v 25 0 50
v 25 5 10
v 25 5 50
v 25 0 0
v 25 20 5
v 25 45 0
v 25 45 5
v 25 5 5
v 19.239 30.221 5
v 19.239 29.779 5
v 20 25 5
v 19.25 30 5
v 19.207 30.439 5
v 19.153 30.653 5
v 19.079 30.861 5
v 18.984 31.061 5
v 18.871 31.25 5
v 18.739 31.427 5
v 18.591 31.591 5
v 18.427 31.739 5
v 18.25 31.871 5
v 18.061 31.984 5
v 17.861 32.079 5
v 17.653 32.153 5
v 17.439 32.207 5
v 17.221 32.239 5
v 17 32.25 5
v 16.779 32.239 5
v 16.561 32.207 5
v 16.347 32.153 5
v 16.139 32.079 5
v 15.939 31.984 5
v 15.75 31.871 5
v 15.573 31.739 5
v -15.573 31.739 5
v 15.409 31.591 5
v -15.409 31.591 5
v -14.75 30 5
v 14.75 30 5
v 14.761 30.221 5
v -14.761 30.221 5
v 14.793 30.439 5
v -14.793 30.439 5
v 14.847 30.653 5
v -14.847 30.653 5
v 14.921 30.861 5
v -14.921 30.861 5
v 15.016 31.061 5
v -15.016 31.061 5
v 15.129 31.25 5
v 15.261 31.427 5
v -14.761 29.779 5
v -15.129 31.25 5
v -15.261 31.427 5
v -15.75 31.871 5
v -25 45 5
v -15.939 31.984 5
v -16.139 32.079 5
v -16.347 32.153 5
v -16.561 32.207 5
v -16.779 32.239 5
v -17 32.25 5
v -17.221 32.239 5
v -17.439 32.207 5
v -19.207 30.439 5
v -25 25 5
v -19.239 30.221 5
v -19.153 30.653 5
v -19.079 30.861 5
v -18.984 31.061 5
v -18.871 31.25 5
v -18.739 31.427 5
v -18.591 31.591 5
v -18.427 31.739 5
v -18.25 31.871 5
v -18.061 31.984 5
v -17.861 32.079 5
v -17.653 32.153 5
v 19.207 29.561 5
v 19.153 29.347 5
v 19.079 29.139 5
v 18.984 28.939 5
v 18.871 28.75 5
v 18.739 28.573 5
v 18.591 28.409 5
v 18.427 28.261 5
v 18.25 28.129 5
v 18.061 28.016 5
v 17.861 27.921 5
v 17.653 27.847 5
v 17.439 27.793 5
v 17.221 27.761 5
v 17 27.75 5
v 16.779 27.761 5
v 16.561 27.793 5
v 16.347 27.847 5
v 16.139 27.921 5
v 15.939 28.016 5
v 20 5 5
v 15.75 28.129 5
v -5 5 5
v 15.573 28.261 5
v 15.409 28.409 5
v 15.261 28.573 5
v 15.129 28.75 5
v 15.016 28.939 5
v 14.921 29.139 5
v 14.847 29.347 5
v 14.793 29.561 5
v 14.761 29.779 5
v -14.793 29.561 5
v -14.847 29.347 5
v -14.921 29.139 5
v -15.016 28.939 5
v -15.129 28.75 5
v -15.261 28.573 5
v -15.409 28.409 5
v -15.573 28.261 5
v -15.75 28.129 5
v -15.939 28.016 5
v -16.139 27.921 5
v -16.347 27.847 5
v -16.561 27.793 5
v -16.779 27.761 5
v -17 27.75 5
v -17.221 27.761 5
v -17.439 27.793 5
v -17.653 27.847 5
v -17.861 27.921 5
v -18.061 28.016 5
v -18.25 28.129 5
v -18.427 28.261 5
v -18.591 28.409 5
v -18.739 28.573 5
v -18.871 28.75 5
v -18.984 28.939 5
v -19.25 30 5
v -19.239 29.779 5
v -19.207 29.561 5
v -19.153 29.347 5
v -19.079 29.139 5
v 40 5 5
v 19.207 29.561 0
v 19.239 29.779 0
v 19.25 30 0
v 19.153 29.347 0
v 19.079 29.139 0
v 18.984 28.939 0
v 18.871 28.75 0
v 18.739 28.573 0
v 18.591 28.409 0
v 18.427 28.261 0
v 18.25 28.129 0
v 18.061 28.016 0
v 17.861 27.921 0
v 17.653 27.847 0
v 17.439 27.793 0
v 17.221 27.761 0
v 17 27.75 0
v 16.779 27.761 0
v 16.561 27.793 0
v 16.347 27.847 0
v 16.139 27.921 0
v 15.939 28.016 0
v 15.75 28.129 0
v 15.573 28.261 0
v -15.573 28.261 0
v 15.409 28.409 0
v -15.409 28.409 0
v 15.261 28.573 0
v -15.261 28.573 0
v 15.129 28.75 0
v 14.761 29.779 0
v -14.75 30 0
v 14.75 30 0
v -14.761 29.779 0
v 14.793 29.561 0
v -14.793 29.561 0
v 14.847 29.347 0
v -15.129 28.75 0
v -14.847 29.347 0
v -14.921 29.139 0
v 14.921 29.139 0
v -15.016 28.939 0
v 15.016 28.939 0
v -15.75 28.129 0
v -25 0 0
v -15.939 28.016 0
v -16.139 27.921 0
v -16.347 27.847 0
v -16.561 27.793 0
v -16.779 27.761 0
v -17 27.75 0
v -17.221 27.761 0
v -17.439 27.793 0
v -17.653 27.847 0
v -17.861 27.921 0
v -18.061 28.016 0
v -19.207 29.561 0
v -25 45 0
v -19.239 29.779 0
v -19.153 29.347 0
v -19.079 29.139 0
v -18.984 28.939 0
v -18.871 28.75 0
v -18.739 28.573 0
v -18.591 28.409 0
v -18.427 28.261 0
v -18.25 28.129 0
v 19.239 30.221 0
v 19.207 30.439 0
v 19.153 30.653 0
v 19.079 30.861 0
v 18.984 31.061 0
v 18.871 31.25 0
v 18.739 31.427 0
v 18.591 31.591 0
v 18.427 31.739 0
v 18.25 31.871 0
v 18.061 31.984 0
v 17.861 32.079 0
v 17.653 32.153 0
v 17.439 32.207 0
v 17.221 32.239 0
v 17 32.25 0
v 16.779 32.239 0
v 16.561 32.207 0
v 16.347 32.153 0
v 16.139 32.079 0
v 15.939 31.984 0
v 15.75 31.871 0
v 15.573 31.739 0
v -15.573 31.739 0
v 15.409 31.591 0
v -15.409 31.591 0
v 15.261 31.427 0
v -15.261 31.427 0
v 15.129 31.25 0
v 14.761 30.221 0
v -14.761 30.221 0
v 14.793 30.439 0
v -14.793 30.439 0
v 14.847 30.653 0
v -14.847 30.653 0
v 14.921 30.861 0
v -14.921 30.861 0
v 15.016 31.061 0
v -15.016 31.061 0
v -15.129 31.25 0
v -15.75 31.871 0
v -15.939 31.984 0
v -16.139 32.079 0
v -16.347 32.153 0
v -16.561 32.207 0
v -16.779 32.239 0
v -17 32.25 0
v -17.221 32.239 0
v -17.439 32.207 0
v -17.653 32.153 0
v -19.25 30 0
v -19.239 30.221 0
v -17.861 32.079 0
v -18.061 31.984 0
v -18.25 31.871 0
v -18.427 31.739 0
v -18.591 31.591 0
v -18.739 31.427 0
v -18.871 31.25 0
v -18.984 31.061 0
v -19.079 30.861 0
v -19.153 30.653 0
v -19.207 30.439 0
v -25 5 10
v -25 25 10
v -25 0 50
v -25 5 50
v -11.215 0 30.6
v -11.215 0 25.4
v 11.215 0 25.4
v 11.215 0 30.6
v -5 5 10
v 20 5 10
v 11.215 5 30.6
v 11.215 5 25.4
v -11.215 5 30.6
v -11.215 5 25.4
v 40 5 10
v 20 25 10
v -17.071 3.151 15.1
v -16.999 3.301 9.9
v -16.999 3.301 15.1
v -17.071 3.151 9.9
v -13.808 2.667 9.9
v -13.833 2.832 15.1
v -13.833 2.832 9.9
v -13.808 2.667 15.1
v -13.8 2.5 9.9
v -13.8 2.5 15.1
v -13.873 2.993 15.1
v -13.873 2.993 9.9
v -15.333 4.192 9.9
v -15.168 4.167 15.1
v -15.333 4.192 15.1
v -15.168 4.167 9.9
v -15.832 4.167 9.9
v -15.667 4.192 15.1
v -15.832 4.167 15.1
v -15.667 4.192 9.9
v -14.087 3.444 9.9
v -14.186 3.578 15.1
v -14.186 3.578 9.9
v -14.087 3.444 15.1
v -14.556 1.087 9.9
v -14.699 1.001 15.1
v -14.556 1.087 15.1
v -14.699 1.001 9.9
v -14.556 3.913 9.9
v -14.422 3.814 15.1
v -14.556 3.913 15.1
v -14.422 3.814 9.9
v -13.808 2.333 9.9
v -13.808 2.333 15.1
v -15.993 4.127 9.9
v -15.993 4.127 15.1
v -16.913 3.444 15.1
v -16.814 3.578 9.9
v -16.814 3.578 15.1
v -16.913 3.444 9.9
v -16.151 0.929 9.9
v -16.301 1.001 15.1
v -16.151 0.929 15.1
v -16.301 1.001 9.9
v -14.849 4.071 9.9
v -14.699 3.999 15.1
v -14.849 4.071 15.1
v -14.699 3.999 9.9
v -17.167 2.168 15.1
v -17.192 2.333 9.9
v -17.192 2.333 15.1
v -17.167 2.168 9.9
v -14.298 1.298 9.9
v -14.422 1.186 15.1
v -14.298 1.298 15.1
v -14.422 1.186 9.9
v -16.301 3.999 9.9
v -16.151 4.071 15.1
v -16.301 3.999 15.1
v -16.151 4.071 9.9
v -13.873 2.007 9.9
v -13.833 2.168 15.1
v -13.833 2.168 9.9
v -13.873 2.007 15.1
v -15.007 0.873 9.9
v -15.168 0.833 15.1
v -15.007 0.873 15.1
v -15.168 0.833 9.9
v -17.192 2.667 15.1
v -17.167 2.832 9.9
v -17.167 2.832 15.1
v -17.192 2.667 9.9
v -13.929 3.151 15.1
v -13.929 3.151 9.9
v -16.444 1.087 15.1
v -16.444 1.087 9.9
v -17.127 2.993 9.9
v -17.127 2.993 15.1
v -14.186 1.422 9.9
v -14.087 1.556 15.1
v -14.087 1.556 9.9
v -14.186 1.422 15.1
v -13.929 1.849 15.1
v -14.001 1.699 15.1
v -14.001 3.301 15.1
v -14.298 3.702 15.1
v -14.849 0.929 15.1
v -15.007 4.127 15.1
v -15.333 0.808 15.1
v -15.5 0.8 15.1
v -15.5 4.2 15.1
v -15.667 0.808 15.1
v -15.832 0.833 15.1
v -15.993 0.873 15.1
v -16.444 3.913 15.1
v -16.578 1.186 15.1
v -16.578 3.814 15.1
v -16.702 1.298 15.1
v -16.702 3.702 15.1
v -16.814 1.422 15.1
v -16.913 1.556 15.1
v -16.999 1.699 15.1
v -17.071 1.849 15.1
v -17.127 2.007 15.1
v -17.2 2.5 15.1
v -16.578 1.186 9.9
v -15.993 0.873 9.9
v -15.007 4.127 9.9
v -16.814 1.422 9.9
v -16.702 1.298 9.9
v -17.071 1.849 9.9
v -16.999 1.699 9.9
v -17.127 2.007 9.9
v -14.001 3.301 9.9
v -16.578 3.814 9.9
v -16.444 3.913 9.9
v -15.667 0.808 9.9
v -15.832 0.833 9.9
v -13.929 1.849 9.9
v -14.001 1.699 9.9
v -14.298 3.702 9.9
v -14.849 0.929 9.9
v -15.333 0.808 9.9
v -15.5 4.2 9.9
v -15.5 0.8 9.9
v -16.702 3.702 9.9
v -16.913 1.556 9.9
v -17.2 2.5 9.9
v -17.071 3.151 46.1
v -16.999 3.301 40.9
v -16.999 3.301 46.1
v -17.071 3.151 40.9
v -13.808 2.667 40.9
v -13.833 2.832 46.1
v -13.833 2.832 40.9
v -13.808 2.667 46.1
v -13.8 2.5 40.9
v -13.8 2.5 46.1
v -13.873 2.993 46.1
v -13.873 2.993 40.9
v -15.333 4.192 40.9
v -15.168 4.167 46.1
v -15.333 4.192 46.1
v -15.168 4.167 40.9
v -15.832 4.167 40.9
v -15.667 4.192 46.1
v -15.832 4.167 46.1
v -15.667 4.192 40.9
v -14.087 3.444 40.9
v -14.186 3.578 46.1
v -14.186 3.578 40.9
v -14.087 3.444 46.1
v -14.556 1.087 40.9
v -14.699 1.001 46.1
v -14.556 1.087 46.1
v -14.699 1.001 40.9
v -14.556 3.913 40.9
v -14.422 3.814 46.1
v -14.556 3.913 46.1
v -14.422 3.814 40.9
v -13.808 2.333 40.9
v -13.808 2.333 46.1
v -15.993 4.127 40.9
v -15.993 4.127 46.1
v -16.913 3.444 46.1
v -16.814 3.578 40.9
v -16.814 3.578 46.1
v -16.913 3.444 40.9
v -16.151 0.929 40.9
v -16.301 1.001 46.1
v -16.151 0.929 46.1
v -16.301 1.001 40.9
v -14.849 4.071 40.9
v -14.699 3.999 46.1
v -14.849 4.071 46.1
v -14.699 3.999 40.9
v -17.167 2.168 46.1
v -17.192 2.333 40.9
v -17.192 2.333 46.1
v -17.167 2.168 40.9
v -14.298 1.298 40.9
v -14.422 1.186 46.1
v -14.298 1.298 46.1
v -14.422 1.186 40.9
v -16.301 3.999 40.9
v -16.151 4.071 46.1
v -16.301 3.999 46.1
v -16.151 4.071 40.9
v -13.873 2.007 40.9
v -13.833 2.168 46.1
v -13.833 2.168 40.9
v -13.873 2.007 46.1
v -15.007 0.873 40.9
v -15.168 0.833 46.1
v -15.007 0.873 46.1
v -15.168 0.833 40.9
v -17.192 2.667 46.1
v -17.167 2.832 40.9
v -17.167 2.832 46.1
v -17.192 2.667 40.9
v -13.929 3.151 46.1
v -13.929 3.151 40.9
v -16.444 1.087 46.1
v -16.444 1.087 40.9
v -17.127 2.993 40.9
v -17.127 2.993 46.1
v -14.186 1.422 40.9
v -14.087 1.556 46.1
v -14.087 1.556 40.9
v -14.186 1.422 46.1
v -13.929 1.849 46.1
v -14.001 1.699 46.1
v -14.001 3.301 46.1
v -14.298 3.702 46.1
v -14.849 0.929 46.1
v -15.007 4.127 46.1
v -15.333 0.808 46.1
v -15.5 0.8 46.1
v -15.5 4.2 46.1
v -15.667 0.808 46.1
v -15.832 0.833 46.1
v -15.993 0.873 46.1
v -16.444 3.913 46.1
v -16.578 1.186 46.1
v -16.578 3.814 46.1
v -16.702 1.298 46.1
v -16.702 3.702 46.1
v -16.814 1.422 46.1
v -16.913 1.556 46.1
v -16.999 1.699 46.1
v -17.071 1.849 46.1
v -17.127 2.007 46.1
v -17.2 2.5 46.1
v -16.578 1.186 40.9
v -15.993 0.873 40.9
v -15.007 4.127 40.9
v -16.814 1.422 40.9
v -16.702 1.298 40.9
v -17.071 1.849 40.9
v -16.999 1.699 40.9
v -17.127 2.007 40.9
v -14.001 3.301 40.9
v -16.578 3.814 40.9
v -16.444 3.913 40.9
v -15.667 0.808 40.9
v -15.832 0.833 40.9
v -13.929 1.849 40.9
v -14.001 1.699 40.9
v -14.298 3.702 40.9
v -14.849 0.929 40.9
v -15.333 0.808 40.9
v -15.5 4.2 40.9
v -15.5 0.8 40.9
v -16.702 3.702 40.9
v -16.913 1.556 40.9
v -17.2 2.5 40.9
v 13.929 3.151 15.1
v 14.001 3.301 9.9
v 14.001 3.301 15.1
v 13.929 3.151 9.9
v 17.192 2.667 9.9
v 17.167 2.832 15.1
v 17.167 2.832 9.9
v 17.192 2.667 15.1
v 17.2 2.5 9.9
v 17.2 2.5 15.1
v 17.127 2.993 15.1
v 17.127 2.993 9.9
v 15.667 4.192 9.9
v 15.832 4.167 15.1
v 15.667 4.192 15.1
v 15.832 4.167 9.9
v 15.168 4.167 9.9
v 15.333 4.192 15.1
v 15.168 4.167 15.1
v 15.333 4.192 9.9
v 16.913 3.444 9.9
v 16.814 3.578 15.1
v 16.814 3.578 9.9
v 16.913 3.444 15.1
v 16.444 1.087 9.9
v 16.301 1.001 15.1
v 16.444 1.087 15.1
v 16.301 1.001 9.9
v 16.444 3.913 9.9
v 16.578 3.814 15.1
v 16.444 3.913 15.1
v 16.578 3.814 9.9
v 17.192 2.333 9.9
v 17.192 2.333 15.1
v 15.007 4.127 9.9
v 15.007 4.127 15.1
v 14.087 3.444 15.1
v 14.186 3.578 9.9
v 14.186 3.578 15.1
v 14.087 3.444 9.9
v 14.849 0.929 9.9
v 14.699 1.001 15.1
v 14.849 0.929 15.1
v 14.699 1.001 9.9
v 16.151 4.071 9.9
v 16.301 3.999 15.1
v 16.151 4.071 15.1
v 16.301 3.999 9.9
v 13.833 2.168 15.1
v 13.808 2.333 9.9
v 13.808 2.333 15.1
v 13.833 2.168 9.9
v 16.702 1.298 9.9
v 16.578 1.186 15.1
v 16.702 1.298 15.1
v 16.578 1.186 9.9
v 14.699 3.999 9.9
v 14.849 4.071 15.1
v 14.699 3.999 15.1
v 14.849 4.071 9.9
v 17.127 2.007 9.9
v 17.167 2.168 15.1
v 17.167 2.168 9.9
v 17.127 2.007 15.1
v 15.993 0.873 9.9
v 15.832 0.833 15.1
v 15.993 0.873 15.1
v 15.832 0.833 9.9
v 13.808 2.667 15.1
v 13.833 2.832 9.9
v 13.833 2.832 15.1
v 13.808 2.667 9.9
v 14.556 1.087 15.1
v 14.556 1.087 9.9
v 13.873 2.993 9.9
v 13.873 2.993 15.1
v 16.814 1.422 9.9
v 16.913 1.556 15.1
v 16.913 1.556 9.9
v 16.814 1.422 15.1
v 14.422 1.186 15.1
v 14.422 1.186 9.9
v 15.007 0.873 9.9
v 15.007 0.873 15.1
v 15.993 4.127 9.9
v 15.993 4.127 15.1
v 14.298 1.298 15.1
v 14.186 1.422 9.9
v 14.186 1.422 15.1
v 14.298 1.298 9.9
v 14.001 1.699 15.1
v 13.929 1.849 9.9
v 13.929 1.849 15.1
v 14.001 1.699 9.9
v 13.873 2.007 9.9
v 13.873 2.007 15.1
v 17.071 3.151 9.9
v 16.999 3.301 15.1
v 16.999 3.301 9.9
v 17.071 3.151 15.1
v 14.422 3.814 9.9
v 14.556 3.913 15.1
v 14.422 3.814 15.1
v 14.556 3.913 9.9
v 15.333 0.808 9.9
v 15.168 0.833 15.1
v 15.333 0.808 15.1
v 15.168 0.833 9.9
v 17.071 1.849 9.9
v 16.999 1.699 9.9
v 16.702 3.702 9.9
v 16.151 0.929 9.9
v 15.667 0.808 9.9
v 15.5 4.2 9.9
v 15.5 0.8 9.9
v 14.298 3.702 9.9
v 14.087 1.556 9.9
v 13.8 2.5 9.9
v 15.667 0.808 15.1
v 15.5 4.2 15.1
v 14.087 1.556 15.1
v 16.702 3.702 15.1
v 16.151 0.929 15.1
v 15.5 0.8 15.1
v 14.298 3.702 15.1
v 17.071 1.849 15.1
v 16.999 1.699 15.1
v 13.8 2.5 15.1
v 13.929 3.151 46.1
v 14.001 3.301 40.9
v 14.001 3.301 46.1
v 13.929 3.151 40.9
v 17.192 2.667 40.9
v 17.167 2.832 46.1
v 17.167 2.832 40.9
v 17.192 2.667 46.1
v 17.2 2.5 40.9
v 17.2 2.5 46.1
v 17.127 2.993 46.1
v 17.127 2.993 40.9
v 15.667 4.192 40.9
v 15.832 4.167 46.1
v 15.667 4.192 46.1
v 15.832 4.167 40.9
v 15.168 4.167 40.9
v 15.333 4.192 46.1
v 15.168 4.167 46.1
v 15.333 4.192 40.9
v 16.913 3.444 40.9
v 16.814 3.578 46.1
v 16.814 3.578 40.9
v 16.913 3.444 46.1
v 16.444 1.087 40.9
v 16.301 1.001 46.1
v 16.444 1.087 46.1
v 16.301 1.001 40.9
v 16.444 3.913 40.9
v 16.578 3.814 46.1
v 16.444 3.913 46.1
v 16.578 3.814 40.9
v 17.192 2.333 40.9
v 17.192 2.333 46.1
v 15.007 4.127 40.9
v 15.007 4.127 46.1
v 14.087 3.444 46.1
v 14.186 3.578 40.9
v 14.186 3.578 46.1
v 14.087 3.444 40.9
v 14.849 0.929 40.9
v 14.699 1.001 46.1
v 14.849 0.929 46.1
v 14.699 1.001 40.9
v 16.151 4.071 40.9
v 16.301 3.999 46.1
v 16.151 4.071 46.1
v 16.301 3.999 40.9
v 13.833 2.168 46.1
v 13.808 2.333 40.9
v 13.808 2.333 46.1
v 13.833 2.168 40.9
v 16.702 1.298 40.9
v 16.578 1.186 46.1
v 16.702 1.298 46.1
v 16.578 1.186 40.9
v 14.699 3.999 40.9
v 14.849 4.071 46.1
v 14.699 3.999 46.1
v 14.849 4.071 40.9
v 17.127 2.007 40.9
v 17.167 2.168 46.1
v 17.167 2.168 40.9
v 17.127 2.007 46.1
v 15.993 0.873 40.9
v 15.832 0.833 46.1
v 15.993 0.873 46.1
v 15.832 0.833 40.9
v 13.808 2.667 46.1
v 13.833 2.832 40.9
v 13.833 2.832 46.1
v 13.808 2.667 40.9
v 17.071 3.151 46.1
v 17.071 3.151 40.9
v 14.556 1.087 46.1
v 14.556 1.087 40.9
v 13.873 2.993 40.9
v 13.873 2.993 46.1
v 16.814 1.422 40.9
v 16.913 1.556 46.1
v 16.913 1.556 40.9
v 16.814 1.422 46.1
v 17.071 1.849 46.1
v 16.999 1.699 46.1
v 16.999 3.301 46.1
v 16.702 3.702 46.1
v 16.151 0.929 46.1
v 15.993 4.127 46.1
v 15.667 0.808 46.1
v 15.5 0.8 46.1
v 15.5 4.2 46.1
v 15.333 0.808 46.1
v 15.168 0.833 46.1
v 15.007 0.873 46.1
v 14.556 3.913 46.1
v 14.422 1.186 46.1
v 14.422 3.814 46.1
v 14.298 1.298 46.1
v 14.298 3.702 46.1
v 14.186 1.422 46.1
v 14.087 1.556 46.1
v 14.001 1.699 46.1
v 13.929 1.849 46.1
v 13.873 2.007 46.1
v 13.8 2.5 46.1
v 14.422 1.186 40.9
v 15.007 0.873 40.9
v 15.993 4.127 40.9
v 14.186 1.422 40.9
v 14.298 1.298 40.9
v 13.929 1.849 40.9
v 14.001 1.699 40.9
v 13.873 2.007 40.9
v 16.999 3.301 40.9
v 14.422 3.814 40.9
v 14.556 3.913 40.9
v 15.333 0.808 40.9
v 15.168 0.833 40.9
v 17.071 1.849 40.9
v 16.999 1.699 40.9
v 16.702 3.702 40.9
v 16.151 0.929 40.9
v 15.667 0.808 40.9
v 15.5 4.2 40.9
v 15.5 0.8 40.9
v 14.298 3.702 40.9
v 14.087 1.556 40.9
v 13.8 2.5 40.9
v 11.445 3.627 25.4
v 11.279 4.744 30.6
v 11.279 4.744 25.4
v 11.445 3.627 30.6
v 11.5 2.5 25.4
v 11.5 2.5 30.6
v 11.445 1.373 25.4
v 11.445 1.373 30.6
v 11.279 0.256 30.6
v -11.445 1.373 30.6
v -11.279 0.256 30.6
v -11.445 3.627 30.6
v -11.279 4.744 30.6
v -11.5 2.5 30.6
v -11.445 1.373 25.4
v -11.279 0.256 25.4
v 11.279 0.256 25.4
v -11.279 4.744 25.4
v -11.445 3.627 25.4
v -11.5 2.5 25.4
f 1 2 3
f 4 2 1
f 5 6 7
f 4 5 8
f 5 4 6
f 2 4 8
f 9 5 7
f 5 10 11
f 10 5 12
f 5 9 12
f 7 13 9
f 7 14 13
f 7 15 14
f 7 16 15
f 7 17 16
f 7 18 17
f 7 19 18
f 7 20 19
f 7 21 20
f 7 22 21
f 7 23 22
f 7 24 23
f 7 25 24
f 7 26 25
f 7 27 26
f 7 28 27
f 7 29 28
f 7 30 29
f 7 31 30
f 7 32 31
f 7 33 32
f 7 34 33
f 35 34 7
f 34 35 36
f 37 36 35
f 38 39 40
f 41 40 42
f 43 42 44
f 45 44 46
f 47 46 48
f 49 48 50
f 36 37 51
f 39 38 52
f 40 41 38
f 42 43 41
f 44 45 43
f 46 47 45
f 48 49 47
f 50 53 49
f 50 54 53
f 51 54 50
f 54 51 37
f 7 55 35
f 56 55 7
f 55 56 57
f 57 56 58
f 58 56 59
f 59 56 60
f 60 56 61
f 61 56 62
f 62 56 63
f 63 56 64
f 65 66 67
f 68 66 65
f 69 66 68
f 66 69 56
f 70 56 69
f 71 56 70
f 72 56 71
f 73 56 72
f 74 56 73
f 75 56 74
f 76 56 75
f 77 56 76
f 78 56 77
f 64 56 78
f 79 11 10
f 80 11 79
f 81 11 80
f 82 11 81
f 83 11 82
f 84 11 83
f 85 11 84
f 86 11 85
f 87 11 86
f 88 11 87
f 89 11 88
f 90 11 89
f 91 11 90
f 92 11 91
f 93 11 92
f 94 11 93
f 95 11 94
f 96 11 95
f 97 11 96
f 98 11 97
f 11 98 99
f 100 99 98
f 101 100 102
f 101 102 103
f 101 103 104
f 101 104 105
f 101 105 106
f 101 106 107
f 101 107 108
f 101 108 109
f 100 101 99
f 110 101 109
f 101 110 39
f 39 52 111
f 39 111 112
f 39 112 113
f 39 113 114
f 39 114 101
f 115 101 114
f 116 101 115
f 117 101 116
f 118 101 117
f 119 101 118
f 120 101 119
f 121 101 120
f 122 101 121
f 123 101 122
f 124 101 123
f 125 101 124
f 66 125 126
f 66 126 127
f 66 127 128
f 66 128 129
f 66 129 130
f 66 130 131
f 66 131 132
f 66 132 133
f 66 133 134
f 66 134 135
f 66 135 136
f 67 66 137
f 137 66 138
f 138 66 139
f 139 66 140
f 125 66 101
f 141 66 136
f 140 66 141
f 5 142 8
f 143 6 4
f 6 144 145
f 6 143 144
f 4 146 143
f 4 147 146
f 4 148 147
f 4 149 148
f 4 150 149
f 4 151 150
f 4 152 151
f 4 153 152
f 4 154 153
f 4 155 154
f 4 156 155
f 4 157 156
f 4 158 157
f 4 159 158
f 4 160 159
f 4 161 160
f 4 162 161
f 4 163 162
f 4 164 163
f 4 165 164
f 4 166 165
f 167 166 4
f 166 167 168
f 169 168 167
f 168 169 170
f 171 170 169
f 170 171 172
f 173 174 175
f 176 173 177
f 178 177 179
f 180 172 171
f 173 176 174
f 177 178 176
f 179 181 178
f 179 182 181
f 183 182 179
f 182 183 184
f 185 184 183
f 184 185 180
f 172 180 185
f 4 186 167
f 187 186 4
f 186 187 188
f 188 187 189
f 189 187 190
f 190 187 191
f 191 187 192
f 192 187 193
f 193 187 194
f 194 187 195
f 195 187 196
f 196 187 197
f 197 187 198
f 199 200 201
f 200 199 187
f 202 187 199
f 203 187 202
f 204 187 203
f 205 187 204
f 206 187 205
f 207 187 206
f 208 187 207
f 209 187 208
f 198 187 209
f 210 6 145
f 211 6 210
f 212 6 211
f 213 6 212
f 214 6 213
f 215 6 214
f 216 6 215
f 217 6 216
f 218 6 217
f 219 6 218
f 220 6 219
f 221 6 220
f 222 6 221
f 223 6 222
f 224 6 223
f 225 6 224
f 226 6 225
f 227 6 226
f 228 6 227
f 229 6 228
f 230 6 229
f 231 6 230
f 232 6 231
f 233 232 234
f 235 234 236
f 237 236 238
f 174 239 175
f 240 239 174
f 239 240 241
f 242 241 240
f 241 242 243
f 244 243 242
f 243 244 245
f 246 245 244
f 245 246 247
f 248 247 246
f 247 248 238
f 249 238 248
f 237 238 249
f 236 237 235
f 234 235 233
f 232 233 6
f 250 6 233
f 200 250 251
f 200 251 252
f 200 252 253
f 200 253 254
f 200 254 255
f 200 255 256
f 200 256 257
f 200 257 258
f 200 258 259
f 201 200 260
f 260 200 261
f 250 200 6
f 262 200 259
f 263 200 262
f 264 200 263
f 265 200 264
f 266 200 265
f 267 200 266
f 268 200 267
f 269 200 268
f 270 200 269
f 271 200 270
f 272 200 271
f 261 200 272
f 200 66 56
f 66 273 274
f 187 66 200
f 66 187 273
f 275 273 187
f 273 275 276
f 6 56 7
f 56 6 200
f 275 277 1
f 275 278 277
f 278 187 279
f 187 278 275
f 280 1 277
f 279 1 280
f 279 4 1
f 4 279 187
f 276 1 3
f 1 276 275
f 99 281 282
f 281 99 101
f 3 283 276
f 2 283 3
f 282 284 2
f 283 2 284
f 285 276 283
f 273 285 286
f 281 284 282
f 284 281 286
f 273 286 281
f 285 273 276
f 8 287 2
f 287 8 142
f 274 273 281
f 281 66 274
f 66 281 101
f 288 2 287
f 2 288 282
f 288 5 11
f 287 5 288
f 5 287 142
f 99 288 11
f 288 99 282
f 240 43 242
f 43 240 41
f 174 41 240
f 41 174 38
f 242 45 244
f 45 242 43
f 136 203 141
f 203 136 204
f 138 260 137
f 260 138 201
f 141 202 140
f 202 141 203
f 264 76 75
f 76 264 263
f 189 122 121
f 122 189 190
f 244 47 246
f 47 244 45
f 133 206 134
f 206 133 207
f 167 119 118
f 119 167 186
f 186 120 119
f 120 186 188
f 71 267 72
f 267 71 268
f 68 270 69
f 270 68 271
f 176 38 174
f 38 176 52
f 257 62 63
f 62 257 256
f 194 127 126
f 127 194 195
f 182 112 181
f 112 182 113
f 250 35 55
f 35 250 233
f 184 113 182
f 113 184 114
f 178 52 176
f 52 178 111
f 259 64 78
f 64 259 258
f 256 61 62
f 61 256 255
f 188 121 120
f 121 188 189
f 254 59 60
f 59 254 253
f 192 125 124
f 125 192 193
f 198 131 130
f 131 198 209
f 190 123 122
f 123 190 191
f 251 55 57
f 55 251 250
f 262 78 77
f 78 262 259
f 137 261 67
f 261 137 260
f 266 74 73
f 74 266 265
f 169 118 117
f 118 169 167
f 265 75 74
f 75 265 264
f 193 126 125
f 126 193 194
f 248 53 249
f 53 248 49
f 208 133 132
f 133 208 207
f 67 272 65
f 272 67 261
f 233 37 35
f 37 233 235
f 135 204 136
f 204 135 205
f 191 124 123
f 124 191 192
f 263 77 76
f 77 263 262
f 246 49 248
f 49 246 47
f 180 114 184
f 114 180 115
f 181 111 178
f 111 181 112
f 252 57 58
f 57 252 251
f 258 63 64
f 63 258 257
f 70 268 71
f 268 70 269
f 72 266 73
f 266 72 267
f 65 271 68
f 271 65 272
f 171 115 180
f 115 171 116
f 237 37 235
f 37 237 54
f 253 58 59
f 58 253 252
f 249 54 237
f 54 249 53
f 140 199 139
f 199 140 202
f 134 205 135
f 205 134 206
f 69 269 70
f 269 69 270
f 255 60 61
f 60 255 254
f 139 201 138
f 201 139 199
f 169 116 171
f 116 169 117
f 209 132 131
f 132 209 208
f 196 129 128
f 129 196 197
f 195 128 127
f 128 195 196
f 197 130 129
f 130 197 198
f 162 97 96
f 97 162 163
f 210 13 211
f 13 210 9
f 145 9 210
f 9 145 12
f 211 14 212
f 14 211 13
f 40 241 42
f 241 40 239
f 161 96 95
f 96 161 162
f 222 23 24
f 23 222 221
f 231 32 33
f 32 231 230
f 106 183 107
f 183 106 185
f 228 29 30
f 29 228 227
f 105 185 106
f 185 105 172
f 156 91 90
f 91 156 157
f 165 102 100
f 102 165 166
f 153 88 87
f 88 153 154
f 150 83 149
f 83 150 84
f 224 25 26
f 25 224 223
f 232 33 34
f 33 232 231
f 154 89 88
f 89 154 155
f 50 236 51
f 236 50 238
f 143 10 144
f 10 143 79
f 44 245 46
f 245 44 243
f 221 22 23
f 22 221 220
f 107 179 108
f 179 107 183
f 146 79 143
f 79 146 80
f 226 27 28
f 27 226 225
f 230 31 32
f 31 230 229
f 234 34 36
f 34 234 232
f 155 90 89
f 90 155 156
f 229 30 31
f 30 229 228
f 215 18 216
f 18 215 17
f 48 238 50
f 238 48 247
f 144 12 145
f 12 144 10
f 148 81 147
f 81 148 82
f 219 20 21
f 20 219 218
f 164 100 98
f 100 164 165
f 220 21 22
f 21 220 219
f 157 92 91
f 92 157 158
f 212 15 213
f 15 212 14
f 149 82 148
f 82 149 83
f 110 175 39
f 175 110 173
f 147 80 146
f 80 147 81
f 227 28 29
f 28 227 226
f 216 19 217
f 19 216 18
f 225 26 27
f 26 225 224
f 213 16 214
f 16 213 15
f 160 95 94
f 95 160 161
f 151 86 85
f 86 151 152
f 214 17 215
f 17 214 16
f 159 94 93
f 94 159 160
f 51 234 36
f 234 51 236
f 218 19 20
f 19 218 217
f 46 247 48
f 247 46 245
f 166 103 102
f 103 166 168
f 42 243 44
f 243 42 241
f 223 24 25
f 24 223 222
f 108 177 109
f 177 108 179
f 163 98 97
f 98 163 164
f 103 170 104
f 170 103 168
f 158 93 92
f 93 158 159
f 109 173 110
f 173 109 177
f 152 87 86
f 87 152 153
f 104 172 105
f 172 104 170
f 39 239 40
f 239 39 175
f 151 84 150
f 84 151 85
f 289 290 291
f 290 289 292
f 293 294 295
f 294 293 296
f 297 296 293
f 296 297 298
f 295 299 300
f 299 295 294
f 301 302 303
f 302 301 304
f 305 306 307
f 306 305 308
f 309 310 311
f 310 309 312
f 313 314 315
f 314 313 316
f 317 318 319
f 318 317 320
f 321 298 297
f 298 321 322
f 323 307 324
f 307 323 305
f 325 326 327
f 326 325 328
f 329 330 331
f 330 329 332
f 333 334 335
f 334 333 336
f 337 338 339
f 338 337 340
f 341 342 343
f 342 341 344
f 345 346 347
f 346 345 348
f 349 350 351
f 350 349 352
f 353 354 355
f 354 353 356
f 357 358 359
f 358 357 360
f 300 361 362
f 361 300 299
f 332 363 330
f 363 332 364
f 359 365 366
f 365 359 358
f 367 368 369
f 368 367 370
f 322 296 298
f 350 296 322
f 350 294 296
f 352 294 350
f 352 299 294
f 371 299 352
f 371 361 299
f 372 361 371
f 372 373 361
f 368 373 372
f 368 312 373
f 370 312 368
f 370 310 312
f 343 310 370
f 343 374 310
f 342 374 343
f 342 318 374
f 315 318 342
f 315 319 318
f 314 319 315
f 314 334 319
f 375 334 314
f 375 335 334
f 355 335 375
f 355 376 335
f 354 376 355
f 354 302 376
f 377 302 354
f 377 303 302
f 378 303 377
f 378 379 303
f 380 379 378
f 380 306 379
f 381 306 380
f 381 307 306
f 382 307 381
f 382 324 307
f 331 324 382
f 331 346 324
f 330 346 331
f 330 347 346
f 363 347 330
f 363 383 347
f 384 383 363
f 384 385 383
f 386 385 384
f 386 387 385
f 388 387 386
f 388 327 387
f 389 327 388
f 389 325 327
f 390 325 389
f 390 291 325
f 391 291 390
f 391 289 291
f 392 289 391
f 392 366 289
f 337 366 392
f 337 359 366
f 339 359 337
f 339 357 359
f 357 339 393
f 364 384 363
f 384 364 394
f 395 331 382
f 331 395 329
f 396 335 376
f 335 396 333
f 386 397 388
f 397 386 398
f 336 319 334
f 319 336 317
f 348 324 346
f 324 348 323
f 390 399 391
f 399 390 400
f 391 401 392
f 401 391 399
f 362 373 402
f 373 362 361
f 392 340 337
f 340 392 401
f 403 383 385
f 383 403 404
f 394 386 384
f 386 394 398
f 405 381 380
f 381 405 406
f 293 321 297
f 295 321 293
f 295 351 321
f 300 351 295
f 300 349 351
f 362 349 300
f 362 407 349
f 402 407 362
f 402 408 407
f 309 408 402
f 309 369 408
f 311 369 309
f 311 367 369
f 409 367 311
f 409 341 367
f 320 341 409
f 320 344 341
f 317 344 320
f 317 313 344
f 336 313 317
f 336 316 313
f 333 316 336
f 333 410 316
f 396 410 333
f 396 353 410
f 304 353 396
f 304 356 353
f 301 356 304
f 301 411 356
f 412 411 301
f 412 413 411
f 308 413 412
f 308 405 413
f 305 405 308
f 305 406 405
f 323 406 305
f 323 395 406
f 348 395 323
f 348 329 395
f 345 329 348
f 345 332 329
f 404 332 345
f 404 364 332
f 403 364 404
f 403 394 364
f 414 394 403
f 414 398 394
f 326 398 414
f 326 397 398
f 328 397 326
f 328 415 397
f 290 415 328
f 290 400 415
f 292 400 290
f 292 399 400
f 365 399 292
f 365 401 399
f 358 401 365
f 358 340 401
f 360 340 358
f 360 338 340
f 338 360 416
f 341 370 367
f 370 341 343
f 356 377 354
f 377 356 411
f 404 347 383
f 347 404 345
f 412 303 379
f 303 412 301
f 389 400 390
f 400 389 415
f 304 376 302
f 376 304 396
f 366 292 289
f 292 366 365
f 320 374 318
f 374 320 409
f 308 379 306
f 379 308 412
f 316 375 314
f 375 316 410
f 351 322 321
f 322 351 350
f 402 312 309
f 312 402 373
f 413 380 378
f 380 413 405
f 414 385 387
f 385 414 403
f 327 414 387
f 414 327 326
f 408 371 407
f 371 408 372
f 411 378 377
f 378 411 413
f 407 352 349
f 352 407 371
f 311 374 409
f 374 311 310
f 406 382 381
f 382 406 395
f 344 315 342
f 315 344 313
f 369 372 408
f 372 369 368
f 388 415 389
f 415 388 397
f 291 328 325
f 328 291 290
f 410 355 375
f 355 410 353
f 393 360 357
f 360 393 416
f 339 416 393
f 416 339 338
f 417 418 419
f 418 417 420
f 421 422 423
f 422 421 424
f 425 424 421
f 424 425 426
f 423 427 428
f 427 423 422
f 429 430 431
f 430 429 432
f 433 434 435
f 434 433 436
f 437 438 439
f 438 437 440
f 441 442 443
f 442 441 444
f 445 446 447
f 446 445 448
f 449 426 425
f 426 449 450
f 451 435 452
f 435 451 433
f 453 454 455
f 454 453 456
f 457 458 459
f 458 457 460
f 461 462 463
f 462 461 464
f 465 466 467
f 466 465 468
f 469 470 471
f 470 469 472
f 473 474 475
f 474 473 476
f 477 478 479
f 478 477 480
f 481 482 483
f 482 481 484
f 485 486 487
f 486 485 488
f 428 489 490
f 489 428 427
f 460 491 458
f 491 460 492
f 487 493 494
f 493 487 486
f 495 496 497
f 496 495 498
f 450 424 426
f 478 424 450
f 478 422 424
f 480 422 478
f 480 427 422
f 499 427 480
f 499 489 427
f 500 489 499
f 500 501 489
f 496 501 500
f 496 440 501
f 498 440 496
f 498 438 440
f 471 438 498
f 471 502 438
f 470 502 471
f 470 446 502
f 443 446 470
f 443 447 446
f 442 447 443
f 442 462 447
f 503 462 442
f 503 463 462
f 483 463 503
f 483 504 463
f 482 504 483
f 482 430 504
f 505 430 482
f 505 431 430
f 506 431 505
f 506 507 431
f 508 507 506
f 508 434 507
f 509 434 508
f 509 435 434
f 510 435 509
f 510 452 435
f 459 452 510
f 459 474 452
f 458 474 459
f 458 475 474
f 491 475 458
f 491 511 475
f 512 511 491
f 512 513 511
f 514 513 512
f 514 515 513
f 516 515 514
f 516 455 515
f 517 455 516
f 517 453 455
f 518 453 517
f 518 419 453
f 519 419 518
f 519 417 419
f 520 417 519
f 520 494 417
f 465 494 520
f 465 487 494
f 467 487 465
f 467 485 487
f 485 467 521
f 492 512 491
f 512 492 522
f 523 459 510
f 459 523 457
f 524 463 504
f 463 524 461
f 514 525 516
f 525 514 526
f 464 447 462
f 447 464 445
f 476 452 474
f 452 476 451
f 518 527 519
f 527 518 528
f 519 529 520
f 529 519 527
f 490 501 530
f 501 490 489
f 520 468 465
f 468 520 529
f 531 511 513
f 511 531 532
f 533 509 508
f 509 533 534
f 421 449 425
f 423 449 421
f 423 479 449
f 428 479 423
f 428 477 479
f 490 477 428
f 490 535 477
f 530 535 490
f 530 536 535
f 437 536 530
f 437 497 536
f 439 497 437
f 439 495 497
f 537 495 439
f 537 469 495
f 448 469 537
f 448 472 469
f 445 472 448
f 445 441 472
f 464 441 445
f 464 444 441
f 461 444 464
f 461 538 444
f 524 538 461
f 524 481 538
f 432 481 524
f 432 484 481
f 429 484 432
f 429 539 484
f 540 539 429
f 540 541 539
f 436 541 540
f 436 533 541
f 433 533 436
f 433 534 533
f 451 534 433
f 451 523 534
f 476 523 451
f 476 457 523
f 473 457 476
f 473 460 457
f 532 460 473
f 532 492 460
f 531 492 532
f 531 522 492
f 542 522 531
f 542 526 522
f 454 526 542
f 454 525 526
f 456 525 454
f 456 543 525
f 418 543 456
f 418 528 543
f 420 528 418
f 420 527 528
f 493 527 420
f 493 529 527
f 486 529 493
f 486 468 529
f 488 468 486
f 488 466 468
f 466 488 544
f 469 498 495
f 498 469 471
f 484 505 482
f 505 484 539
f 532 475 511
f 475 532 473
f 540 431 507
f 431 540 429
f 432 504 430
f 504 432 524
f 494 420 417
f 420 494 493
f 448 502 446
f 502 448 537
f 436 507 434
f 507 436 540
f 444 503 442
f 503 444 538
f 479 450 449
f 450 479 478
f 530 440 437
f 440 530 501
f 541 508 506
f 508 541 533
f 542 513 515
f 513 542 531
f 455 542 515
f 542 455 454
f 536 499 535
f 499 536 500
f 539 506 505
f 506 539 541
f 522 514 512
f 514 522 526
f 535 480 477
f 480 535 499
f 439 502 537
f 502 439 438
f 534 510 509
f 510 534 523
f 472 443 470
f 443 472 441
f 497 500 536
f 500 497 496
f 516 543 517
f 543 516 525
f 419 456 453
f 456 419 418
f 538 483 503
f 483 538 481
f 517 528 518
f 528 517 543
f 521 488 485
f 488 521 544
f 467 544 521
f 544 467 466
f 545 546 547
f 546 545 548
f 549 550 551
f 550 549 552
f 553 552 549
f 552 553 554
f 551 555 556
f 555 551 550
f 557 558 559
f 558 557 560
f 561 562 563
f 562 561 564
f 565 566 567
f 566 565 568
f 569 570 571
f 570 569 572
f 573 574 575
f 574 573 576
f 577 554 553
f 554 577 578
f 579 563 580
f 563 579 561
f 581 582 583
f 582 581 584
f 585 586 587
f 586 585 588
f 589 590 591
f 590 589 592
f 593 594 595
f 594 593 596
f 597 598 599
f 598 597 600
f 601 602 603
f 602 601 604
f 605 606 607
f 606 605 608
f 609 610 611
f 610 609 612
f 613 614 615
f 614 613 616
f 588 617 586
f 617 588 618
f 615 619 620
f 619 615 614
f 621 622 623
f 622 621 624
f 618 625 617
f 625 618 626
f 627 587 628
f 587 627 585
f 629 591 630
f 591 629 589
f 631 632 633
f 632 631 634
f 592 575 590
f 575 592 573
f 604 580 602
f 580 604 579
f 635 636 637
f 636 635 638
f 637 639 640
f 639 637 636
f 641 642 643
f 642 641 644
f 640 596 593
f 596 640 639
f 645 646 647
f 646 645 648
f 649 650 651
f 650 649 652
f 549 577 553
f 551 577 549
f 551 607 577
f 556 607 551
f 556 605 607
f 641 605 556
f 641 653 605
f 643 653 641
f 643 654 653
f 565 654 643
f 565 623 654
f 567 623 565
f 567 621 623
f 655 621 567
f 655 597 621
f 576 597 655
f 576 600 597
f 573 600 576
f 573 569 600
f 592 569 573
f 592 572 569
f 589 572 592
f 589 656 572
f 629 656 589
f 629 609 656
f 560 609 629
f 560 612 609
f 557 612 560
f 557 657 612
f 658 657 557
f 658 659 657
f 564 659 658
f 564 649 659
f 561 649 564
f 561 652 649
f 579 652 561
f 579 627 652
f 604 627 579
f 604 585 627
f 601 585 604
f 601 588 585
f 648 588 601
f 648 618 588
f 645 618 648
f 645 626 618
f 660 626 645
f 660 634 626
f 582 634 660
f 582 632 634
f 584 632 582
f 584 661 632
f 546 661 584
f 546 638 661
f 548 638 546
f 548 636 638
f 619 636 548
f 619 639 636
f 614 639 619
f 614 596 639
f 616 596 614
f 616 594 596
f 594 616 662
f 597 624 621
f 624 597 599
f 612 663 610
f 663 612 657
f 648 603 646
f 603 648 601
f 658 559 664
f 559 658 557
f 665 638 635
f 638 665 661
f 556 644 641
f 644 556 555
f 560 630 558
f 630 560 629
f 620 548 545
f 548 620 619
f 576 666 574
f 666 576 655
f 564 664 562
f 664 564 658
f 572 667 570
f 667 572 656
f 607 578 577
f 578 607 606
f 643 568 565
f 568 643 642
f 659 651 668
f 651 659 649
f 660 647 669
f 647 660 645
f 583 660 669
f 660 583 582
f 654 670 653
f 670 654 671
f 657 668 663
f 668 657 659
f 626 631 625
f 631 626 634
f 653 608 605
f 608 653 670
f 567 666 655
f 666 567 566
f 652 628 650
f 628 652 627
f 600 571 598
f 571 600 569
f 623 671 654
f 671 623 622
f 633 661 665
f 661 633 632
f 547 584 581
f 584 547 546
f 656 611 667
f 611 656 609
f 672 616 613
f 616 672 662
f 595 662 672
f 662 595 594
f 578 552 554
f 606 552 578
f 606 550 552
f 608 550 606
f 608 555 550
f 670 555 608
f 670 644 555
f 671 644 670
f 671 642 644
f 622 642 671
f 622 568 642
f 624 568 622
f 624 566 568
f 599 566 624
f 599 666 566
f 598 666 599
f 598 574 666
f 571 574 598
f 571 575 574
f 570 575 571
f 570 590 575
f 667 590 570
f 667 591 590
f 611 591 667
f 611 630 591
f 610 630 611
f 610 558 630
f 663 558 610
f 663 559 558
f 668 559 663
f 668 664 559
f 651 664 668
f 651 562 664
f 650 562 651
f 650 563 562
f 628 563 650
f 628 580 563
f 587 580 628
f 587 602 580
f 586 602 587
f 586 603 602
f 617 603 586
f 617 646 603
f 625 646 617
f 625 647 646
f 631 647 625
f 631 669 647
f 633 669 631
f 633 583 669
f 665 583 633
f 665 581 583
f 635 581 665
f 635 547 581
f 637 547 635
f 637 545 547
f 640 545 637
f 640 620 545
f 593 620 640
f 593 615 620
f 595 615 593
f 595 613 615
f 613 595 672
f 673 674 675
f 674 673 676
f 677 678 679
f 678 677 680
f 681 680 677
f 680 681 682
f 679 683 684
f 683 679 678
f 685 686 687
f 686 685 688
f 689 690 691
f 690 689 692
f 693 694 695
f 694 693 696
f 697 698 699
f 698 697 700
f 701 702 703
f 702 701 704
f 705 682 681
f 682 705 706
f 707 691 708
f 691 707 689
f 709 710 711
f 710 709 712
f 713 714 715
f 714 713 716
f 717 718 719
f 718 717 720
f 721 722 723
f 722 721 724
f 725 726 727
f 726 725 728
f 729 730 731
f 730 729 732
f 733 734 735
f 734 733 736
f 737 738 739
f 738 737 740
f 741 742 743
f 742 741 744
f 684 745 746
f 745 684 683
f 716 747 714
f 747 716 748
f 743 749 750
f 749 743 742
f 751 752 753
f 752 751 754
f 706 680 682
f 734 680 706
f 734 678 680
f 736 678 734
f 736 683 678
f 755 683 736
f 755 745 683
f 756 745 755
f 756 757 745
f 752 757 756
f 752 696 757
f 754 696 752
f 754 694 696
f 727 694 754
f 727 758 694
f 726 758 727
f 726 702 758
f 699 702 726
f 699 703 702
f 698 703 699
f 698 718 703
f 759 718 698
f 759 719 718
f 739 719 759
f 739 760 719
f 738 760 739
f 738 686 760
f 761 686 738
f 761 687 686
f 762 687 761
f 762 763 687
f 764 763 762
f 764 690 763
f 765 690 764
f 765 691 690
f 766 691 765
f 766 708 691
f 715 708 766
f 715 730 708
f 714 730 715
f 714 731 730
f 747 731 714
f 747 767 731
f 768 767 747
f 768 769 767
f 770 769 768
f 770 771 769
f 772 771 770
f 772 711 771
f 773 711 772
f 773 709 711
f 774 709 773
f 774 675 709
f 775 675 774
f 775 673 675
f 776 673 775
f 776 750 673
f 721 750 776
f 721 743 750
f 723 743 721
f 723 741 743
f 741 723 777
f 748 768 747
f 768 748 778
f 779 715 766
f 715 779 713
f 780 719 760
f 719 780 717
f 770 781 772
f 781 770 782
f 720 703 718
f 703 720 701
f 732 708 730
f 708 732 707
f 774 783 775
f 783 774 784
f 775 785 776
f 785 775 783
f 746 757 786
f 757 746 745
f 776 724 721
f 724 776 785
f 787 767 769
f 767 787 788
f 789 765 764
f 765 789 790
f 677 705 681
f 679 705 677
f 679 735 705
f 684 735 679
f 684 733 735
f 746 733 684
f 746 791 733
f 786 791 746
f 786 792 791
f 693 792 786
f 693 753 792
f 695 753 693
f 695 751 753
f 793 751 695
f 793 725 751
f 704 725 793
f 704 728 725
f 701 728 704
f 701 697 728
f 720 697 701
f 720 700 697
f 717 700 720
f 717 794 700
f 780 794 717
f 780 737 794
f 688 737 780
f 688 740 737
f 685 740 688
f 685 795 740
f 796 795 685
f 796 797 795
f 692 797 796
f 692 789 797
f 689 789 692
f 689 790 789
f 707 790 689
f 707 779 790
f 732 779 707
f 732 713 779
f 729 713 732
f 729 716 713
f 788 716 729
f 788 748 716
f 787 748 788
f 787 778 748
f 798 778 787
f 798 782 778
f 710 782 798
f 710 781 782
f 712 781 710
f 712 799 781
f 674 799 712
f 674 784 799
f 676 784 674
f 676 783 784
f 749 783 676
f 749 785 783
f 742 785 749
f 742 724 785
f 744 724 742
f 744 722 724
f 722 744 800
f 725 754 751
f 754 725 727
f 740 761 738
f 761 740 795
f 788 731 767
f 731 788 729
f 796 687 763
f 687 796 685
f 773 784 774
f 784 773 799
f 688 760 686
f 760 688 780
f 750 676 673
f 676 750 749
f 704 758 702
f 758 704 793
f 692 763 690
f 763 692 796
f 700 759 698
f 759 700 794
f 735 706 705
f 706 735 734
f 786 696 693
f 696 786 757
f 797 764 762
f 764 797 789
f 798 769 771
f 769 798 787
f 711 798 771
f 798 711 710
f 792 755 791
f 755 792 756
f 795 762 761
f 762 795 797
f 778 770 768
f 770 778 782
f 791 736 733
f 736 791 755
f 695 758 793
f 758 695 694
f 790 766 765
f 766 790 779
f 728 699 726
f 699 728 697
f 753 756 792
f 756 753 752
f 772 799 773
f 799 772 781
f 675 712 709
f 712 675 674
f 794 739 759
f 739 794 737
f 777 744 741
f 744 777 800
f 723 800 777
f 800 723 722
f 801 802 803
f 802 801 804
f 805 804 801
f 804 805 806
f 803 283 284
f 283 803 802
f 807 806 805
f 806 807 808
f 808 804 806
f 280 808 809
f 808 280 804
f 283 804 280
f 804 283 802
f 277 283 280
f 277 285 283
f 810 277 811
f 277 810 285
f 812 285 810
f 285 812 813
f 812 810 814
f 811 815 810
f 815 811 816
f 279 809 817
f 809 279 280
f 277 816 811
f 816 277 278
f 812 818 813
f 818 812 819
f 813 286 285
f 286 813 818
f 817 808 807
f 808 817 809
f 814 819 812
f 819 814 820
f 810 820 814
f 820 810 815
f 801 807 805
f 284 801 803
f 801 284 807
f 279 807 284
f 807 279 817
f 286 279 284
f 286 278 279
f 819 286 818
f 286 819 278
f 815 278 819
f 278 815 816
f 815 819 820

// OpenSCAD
// Dimensions
base_x = 50;
base_y = 45;
base_z = 5;

motor_x = 50;
motor_y = 5;
motor_z = 50;

m4_dia = 4.5;
m4_extend = 0.2;

boss_dia = 23;
boss_cx = 0;
boss_cz = 28;
boss_extend = 0.2;

m3_dia = 3.4;
m3_sq = 31;
m3_extend = 0.2;

gusset_thick = 5;
gusset_ly = 20;
gusset_lz = 20;
gusset_r_y = 5;
gusset_r_z = 5;

$fn = 64;

module bracket_body() {
    union() {
        // Base plate
        translate([-base_x/2, 0, 0])
            cube([base_x, base_y, base_z]);
            
        // Motor plate
        translate([-motor_x/2, 0, 0])
            cube([motor_x, motor_y, motor_z]);
            
        // Left gusset
        translate([-base_x/2, gusset_r_y, gusset_r_z])
            linear_extrude(height=gusset_thick)
                polygon([[0, 0], [gusset_ly, 0], [0, gusset_lz]]);
        
        // Right gusset
        translate([base_x/2 - gusset_thick, gusset_r_y, gusset_r_z])
            linear_extrude(height=gusset_thick)
                polygon([[0, 0], [gusset_ly, 0], [0, gusset_lz]]);
    }
}

module holes() {
    // M4 mounting holes
    for (i = [-1, 1]) {
        translate([i * 17, 30, 0])
            cylinder(d=m4_dia, h=base_z + m4_extend, center=false);
    }
    
    // Boss hole
    translate([boss_cx, motor_y/2, boss_cz])
        cylinder(d=boss_dia, h=motor_y + boss_extend, center=true);
        
    // M3 screw holes
    for (ix = [-1, 1]) {
        for (iz = [-1, 1]) {
            translate([ix * m3_sq/2, motor_y/2, boss_cz + iz * m3_sq/2])
                cylinder(d=m3_dia, h=motor_y + m3_extend, center=true);
        }
    }
}

difference() {
    bracket_body();
    holes();
}
